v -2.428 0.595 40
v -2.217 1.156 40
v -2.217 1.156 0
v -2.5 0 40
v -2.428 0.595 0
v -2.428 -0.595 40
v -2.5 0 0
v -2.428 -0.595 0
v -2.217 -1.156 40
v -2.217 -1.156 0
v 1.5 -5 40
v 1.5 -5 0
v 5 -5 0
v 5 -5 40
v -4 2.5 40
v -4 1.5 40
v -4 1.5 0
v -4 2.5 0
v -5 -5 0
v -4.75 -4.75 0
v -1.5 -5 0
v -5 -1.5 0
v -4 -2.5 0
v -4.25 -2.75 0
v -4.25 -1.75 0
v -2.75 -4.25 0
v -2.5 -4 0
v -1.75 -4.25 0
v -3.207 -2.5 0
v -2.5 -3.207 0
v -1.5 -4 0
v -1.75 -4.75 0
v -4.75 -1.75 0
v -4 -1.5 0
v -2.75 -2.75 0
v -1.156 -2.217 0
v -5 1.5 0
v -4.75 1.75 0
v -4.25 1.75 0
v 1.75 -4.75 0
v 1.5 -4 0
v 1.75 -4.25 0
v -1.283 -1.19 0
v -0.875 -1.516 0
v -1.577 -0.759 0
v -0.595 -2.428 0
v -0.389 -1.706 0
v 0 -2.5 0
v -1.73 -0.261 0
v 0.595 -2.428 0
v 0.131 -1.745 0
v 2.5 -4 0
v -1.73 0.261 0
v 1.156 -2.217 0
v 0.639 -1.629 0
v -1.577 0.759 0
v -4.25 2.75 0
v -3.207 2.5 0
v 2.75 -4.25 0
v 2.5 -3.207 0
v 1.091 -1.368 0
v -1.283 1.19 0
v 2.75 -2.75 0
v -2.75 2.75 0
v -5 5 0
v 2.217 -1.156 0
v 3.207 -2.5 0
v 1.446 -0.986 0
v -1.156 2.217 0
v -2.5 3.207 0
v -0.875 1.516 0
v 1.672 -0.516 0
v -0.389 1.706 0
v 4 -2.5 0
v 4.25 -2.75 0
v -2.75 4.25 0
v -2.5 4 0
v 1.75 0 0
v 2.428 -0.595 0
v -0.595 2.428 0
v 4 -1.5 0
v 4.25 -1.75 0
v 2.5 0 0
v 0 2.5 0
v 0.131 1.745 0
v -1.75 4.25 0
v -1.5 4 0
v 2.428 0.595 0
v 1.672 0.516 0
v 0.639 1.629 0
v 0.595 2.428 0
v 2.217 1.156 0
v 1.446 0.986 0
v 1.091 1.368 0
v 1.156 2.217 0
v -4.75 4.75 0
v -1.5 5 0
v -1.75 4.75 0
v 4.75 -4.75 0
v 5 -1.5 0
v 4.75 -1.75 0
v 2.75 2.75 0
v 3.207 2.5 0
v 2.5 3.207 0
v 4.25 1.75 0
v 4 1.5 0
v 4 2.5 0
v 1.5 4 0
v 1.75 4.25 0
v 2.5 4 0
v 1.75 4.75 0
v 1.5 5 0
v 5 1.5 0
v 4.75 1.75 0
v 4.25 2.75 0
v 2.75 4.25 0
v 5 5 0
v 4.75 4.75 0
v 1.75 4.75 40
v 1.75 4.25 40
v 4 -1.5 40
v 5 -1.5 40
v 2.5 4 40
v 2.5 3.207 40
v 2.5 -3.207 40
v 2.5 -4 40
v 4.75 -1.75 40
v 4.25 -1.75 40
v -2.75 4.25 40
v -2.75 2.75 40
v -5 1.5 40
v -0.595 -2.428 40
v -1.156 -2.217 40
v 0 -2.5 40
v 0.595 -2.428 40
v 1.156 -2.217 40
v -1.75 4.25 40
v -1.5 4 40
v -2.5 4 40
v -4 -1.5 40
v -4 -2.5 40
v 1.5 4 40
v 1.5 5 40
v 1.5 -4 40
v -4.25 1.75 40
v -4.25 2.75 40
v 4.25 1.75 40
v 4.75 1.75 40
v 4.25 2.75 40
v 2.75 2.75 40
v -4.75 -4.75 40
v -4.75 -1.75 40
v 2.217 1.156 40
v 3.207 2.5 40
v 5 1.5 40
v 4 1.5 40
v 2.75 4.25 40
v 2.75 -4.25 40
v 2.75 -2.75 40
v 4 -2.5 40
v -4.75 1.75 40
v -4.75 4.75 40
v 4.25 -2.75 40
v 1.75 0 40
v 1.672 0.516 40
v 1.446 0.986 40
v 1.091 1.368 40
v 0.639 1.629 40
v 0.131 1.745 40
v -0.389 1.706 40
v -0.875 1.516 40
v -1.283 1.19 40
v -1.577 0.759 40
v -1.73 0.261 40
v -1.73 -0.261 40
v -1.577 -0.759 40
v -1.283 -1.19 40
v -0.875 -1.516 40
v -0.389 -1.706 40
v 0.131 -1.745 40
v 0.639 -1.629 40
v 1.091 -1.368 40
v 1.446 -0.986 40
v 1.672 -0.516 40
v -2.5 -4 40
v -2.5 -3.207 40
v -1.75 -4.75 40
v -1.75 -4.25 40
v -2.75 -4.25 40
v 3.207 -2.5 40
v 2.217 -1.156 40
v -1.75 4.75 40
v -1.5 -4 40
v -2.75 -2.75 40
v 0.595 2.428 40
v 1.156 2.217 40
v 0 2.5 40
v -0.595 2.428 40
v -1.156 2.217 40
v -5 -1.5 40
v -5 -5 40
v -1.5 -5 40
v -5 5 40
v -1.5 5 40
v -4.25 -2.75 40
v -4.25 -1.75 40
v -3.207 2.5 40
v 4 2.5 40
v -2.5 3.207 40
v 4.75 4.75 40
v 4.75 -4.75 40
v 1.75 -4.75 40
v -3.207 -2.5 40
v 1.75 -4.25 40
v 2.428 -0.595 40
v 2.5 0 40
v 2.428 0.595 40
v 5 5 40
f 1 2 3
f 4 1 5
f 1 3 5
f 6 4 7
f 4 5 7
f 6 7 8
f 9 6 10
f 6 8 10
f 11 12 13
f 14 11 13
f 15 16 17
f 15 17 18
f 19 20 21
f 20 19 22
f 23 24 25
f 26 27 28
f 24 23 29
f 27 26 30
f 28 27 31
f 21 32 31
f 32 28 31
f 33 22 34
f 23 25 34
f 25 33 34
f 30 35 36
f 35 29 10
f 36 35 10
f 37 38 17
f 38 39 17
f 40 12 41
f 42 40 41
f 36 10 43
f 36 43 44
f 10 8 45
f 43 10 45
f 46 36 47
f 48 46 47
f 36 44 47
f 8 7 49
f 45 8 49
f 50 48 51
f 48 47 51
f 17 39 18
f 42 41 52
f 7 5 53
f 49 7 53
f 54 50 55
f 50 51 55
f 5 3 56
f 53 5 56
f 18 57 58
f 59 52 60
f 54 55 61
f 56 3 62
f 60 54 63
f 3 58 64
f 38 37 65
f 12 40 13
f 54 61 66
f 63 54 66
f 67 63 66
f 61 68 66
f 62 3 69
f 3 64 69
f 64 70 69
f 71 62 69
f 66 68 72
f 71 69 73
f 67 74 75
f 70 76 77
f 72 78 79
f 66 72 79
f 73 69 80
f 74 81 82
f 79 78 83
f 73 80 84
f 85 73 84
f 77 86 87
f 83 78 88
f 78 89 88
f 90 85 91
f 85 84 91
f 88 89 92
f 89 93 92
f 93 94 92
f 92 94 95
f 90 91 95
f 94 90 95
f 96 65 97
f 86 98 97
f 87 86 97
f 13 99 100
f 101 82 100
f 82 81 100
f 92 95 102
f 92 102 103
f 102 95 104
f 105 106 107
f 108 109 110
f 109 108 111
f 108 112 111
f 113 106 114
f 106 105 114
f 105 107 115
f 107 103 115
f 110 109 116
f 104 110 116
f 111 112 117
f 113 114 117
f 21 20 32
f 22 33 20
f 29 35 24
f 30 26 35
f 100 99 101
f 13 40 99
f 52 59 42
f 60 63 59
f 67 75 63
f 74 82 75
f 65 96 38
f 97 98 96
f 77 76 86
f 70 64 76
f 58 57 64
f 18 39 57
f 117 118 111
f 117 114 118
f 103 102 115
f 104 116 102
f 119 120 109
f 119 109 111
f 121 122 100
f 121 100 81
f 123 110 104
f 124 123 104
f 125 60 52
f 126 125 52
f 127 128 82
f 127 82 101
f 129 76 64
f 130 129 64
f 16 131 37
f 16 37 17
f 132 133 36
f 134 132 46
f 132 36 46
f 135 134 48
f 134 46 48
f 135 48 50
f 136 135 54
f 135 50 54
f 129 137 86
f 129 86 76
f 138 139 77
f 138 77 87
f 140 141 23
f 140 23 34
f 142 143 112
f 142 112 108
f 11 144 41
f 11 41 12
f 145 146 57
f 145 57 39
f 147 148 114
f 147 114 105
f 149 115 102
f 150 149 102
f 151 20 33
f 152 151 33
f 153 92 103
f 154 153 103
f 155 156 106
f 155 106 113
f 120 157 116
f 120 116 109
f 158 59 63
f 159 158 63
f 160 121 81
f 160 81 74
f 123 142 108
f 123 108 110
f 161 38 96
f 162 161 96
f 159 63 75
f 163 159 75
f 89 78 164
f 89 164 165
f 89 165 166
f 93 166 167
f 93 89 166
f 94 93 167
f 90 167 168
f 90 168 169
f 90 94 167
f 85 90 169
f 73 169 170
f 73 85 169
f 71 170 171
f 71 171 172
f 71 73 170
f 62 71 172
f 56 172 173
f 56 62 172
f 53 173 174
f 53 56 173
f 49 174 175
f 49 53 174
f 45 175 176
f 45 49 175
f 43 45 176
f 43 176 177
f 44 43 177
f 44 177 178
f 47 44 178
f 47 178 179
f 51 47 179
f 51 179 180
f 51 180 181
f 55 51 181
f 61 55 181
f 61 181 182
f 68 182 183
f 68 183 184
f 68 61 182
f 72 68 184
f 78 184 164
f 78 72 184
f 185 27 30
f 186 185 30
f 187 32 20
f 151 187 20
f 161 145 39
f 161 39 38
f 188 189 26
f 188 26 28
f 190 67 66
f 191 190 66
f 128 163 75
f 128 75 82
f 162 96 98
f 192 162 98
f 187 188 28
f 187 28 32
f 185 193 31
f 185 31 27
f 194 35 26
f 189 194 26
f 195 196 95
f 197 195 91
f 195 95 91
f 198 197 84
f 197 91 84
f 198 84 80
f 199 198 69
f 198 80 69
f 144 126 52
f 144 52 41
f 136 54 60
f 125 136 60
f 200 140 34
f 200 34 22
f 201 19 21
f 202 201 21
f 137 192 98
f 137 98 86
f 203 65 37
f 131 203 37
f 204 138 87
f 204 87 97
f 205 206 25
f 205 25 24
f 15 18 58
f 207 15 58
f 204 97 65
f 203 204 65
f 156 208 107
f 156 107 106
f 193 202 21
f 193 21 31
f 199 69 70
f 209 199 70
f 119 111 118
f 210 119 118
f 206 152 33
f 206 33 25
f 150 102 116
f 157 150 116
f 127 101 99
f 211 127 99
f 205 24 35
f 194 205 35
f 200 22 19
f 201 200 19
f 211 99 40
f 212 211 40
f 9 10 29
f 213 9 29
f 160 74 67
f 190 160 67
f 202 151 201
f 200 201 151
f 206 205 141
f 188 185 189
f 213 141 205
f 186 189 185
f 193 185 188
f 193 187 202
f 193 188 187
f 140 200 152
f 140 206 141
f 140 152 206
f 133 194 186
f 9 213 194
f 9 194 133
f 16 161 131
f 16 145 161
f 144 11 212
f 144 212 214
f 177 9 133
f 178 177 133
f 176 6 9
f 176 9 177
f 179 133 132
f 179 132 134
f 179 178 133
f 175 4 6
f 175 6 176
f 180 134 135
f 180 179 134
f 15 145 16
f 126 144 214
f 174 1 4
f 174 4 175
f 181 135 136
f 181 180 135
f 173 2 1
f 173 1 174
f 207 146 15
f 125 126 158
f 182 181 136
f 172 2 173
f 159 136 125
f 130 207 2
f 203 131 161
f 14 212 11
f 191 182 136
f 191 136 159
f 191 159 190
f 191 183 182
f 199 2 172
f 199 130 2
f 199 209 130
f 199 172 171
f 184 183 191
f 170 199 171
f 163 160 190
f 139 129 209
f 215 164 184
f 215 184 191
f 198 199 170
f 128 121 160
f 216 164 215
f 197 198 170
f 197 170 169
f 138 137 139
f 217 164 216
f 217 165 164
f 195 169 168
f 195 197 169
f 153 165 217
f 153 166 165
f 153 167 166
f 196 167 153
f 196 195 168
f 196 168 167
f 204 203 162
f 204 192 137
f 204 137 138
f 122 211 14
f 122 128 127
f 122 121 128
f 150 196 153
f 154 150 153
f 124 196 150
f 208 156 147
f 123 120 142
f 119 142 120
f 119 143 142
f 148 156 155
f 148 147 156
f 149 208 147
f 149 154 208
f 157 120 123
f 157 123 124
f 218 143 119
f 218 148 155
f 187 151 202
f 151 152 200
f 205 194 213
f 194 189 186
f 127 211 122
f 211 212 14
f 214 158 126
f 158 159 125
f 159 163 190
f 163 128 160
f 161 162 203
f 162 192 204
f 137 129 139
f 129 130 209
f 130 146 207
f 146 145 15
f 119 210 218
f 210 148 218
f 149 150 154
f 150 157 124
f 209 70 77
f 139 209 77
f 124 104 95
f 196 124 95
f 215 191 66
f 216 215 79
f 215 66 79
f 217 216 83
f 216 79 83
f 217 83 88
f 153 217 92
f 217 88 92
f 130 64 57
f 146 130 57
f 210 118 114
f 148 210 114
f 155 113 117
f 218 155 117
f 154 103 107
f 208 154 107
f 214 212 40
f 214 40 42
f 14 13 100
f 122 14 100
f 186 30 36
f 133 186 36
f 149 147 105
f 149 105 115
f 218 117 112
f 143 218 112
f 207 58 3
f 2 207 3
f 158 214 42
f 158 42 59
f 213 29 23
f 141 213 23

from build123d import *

# Parameters (mm, degrees)
ESQUISSE1_R        = 1.75
BOSS_EXTRU_1_DEPTH = 40


with BuildPart() as part:
    # Esquisse1 → Boss.-Extru.1 (new body)
    with BuildSketch(Plane.XY):
        with BuildLine():
            Line((-1.5, 5), (-5, 5))
            Line((-5, 5), (-5, 1.5))
            Line((-5, 1.5), (-4, 1.5))
            Line((-4, 1.5), (-4, 2.5))
            Line((-4, 2.5), (-3.207106781, 2.5))
            Line((-3.207106781, 2.5), (-2.216672281, 1.15601211))
            ThreePointArc((-2.216672281, 1.15601211), (-2.5, 0), (-2.216672281, -1.15601211))
            Line((-2.216672281, -1.15601211), (-3.207106781, -2.5))
            Line((-3.207106781, -2.5), (-4, -2.5))
            Line((-4, -2.5), (-4, -1.5))
            Line((-4, -1.5), (-5, -1.5))
            Line((-5, -1.5), (-5, -5))
            Line((-5, -5), (-1.5, -5))
            Line((-1.5, -5), (-1.5, -4))
            Line((-1.5, -4), (-2.5, -4))
            Line((-2.5, -4), (-2.5, -3.207106781))
            Line((-2.5, -3.207106781), (-1.15601211, -2.216672281))
            ThreePointArc((-1.15601211, -2.216672281), (0, -2.5), (1.15601211, -2.216672281))
            Line((1.15601211, -2.216672281), (2.5, -3.207106781))
            Line((2.5, -3.207106781), (2.5, -4))
            Line((2.5, -4), (1.5, -4))
            Line((1.5, -4), (1.5, -5))
            Line((1.5, -5), (5, -5))
            Line((5, -5), (5, -1.5))
            Line((5, -1.5), (4, -1.5))
            Line((4, -1.5), (4, -2.5))
            Line((4, -2.5), (3.207106781, -2.5))
            Line((3.207106781, -2.5), (2.216672281, -1.15601211))
            ThreePointArc((2.216672281, -1.15601211), (2.5, 0), (2.216672281, 1.15601211))
            Line((2.216672281, 1.15601211), (3.207106781, 2.5))
            Line((3.207106781, 2.5), (4, 2.5))
            Line((4, 2.5), (4, 1.5))
            Line((4, 1.5), (5, 1.5))
            Line((5, 1.5), (5, 5))
            Line((5, 5), (1.5, 5))
            Line((1.5, 5), (1.5, 4))
            Line((1.5, 4), (2.5, 4))
            Line((2.5, 4), (2.5, 3.207106781))
            Line((2.5, 3.207106781), (1.15601211, 2.216672281))
            ThreePointArc((1.15601211, 2.216672281), (0, 2.5), (-1.15601211, 2.216672281))
            Line((-1.15601211, 2.216672281), (-2.5, 3.207106781))
            Line((-2.5, 3.207106781), (-2.5, 4))
            Line((-2.5, 4), (-1.5, 4))
            Line((-1.5, 4), (-1.5, 5))
        make_face()
        Polygon((-4.75, 1.75), (-4.75, 4.75), (-1.75, 4.75), (-1.75, 4.25), (-2.75, 4.25), (-2.75, 2.75), (-4.25, 2.75), (-4.25, 1.75), align=None, mode=Mode.SUBTRACT)
        Circle(ESQUISSE1_R, mode=Mode.SUBTRACT)
        Polygon((-4.75, -4.75), (-4.75, -1.75), (-4.25, -1.75), (-4.25, -2.75), (-2.75, -2.75), (-2.75, -4.25), (-1.75, -4.25), (-1.75, -4.75), align=None, mode=Mode.SUBTRACT)
        Polygon((4.75, 4.75), (4.75, 1.75), (4.25, 1.75), (4.25, 2.75), (2.75, 2.75), (2.75, 4.25), (1.75, 4.25), (1.75, 4.75), align=None, mode=Mode.SUBTRACT)
        Polygon((4.75, -4.75), (1.75, -4.75), (1.75, -4.25), (2.75, -4.25), (2.75, -2.75), (4.25, -2.75), (4.25, -1.75), (4.75, -1.75), align=None, mode=Mode.SUBTRACT)
    extrude(amount=BOSS_EXTRU_1_DEPTH)


solid = part.part
